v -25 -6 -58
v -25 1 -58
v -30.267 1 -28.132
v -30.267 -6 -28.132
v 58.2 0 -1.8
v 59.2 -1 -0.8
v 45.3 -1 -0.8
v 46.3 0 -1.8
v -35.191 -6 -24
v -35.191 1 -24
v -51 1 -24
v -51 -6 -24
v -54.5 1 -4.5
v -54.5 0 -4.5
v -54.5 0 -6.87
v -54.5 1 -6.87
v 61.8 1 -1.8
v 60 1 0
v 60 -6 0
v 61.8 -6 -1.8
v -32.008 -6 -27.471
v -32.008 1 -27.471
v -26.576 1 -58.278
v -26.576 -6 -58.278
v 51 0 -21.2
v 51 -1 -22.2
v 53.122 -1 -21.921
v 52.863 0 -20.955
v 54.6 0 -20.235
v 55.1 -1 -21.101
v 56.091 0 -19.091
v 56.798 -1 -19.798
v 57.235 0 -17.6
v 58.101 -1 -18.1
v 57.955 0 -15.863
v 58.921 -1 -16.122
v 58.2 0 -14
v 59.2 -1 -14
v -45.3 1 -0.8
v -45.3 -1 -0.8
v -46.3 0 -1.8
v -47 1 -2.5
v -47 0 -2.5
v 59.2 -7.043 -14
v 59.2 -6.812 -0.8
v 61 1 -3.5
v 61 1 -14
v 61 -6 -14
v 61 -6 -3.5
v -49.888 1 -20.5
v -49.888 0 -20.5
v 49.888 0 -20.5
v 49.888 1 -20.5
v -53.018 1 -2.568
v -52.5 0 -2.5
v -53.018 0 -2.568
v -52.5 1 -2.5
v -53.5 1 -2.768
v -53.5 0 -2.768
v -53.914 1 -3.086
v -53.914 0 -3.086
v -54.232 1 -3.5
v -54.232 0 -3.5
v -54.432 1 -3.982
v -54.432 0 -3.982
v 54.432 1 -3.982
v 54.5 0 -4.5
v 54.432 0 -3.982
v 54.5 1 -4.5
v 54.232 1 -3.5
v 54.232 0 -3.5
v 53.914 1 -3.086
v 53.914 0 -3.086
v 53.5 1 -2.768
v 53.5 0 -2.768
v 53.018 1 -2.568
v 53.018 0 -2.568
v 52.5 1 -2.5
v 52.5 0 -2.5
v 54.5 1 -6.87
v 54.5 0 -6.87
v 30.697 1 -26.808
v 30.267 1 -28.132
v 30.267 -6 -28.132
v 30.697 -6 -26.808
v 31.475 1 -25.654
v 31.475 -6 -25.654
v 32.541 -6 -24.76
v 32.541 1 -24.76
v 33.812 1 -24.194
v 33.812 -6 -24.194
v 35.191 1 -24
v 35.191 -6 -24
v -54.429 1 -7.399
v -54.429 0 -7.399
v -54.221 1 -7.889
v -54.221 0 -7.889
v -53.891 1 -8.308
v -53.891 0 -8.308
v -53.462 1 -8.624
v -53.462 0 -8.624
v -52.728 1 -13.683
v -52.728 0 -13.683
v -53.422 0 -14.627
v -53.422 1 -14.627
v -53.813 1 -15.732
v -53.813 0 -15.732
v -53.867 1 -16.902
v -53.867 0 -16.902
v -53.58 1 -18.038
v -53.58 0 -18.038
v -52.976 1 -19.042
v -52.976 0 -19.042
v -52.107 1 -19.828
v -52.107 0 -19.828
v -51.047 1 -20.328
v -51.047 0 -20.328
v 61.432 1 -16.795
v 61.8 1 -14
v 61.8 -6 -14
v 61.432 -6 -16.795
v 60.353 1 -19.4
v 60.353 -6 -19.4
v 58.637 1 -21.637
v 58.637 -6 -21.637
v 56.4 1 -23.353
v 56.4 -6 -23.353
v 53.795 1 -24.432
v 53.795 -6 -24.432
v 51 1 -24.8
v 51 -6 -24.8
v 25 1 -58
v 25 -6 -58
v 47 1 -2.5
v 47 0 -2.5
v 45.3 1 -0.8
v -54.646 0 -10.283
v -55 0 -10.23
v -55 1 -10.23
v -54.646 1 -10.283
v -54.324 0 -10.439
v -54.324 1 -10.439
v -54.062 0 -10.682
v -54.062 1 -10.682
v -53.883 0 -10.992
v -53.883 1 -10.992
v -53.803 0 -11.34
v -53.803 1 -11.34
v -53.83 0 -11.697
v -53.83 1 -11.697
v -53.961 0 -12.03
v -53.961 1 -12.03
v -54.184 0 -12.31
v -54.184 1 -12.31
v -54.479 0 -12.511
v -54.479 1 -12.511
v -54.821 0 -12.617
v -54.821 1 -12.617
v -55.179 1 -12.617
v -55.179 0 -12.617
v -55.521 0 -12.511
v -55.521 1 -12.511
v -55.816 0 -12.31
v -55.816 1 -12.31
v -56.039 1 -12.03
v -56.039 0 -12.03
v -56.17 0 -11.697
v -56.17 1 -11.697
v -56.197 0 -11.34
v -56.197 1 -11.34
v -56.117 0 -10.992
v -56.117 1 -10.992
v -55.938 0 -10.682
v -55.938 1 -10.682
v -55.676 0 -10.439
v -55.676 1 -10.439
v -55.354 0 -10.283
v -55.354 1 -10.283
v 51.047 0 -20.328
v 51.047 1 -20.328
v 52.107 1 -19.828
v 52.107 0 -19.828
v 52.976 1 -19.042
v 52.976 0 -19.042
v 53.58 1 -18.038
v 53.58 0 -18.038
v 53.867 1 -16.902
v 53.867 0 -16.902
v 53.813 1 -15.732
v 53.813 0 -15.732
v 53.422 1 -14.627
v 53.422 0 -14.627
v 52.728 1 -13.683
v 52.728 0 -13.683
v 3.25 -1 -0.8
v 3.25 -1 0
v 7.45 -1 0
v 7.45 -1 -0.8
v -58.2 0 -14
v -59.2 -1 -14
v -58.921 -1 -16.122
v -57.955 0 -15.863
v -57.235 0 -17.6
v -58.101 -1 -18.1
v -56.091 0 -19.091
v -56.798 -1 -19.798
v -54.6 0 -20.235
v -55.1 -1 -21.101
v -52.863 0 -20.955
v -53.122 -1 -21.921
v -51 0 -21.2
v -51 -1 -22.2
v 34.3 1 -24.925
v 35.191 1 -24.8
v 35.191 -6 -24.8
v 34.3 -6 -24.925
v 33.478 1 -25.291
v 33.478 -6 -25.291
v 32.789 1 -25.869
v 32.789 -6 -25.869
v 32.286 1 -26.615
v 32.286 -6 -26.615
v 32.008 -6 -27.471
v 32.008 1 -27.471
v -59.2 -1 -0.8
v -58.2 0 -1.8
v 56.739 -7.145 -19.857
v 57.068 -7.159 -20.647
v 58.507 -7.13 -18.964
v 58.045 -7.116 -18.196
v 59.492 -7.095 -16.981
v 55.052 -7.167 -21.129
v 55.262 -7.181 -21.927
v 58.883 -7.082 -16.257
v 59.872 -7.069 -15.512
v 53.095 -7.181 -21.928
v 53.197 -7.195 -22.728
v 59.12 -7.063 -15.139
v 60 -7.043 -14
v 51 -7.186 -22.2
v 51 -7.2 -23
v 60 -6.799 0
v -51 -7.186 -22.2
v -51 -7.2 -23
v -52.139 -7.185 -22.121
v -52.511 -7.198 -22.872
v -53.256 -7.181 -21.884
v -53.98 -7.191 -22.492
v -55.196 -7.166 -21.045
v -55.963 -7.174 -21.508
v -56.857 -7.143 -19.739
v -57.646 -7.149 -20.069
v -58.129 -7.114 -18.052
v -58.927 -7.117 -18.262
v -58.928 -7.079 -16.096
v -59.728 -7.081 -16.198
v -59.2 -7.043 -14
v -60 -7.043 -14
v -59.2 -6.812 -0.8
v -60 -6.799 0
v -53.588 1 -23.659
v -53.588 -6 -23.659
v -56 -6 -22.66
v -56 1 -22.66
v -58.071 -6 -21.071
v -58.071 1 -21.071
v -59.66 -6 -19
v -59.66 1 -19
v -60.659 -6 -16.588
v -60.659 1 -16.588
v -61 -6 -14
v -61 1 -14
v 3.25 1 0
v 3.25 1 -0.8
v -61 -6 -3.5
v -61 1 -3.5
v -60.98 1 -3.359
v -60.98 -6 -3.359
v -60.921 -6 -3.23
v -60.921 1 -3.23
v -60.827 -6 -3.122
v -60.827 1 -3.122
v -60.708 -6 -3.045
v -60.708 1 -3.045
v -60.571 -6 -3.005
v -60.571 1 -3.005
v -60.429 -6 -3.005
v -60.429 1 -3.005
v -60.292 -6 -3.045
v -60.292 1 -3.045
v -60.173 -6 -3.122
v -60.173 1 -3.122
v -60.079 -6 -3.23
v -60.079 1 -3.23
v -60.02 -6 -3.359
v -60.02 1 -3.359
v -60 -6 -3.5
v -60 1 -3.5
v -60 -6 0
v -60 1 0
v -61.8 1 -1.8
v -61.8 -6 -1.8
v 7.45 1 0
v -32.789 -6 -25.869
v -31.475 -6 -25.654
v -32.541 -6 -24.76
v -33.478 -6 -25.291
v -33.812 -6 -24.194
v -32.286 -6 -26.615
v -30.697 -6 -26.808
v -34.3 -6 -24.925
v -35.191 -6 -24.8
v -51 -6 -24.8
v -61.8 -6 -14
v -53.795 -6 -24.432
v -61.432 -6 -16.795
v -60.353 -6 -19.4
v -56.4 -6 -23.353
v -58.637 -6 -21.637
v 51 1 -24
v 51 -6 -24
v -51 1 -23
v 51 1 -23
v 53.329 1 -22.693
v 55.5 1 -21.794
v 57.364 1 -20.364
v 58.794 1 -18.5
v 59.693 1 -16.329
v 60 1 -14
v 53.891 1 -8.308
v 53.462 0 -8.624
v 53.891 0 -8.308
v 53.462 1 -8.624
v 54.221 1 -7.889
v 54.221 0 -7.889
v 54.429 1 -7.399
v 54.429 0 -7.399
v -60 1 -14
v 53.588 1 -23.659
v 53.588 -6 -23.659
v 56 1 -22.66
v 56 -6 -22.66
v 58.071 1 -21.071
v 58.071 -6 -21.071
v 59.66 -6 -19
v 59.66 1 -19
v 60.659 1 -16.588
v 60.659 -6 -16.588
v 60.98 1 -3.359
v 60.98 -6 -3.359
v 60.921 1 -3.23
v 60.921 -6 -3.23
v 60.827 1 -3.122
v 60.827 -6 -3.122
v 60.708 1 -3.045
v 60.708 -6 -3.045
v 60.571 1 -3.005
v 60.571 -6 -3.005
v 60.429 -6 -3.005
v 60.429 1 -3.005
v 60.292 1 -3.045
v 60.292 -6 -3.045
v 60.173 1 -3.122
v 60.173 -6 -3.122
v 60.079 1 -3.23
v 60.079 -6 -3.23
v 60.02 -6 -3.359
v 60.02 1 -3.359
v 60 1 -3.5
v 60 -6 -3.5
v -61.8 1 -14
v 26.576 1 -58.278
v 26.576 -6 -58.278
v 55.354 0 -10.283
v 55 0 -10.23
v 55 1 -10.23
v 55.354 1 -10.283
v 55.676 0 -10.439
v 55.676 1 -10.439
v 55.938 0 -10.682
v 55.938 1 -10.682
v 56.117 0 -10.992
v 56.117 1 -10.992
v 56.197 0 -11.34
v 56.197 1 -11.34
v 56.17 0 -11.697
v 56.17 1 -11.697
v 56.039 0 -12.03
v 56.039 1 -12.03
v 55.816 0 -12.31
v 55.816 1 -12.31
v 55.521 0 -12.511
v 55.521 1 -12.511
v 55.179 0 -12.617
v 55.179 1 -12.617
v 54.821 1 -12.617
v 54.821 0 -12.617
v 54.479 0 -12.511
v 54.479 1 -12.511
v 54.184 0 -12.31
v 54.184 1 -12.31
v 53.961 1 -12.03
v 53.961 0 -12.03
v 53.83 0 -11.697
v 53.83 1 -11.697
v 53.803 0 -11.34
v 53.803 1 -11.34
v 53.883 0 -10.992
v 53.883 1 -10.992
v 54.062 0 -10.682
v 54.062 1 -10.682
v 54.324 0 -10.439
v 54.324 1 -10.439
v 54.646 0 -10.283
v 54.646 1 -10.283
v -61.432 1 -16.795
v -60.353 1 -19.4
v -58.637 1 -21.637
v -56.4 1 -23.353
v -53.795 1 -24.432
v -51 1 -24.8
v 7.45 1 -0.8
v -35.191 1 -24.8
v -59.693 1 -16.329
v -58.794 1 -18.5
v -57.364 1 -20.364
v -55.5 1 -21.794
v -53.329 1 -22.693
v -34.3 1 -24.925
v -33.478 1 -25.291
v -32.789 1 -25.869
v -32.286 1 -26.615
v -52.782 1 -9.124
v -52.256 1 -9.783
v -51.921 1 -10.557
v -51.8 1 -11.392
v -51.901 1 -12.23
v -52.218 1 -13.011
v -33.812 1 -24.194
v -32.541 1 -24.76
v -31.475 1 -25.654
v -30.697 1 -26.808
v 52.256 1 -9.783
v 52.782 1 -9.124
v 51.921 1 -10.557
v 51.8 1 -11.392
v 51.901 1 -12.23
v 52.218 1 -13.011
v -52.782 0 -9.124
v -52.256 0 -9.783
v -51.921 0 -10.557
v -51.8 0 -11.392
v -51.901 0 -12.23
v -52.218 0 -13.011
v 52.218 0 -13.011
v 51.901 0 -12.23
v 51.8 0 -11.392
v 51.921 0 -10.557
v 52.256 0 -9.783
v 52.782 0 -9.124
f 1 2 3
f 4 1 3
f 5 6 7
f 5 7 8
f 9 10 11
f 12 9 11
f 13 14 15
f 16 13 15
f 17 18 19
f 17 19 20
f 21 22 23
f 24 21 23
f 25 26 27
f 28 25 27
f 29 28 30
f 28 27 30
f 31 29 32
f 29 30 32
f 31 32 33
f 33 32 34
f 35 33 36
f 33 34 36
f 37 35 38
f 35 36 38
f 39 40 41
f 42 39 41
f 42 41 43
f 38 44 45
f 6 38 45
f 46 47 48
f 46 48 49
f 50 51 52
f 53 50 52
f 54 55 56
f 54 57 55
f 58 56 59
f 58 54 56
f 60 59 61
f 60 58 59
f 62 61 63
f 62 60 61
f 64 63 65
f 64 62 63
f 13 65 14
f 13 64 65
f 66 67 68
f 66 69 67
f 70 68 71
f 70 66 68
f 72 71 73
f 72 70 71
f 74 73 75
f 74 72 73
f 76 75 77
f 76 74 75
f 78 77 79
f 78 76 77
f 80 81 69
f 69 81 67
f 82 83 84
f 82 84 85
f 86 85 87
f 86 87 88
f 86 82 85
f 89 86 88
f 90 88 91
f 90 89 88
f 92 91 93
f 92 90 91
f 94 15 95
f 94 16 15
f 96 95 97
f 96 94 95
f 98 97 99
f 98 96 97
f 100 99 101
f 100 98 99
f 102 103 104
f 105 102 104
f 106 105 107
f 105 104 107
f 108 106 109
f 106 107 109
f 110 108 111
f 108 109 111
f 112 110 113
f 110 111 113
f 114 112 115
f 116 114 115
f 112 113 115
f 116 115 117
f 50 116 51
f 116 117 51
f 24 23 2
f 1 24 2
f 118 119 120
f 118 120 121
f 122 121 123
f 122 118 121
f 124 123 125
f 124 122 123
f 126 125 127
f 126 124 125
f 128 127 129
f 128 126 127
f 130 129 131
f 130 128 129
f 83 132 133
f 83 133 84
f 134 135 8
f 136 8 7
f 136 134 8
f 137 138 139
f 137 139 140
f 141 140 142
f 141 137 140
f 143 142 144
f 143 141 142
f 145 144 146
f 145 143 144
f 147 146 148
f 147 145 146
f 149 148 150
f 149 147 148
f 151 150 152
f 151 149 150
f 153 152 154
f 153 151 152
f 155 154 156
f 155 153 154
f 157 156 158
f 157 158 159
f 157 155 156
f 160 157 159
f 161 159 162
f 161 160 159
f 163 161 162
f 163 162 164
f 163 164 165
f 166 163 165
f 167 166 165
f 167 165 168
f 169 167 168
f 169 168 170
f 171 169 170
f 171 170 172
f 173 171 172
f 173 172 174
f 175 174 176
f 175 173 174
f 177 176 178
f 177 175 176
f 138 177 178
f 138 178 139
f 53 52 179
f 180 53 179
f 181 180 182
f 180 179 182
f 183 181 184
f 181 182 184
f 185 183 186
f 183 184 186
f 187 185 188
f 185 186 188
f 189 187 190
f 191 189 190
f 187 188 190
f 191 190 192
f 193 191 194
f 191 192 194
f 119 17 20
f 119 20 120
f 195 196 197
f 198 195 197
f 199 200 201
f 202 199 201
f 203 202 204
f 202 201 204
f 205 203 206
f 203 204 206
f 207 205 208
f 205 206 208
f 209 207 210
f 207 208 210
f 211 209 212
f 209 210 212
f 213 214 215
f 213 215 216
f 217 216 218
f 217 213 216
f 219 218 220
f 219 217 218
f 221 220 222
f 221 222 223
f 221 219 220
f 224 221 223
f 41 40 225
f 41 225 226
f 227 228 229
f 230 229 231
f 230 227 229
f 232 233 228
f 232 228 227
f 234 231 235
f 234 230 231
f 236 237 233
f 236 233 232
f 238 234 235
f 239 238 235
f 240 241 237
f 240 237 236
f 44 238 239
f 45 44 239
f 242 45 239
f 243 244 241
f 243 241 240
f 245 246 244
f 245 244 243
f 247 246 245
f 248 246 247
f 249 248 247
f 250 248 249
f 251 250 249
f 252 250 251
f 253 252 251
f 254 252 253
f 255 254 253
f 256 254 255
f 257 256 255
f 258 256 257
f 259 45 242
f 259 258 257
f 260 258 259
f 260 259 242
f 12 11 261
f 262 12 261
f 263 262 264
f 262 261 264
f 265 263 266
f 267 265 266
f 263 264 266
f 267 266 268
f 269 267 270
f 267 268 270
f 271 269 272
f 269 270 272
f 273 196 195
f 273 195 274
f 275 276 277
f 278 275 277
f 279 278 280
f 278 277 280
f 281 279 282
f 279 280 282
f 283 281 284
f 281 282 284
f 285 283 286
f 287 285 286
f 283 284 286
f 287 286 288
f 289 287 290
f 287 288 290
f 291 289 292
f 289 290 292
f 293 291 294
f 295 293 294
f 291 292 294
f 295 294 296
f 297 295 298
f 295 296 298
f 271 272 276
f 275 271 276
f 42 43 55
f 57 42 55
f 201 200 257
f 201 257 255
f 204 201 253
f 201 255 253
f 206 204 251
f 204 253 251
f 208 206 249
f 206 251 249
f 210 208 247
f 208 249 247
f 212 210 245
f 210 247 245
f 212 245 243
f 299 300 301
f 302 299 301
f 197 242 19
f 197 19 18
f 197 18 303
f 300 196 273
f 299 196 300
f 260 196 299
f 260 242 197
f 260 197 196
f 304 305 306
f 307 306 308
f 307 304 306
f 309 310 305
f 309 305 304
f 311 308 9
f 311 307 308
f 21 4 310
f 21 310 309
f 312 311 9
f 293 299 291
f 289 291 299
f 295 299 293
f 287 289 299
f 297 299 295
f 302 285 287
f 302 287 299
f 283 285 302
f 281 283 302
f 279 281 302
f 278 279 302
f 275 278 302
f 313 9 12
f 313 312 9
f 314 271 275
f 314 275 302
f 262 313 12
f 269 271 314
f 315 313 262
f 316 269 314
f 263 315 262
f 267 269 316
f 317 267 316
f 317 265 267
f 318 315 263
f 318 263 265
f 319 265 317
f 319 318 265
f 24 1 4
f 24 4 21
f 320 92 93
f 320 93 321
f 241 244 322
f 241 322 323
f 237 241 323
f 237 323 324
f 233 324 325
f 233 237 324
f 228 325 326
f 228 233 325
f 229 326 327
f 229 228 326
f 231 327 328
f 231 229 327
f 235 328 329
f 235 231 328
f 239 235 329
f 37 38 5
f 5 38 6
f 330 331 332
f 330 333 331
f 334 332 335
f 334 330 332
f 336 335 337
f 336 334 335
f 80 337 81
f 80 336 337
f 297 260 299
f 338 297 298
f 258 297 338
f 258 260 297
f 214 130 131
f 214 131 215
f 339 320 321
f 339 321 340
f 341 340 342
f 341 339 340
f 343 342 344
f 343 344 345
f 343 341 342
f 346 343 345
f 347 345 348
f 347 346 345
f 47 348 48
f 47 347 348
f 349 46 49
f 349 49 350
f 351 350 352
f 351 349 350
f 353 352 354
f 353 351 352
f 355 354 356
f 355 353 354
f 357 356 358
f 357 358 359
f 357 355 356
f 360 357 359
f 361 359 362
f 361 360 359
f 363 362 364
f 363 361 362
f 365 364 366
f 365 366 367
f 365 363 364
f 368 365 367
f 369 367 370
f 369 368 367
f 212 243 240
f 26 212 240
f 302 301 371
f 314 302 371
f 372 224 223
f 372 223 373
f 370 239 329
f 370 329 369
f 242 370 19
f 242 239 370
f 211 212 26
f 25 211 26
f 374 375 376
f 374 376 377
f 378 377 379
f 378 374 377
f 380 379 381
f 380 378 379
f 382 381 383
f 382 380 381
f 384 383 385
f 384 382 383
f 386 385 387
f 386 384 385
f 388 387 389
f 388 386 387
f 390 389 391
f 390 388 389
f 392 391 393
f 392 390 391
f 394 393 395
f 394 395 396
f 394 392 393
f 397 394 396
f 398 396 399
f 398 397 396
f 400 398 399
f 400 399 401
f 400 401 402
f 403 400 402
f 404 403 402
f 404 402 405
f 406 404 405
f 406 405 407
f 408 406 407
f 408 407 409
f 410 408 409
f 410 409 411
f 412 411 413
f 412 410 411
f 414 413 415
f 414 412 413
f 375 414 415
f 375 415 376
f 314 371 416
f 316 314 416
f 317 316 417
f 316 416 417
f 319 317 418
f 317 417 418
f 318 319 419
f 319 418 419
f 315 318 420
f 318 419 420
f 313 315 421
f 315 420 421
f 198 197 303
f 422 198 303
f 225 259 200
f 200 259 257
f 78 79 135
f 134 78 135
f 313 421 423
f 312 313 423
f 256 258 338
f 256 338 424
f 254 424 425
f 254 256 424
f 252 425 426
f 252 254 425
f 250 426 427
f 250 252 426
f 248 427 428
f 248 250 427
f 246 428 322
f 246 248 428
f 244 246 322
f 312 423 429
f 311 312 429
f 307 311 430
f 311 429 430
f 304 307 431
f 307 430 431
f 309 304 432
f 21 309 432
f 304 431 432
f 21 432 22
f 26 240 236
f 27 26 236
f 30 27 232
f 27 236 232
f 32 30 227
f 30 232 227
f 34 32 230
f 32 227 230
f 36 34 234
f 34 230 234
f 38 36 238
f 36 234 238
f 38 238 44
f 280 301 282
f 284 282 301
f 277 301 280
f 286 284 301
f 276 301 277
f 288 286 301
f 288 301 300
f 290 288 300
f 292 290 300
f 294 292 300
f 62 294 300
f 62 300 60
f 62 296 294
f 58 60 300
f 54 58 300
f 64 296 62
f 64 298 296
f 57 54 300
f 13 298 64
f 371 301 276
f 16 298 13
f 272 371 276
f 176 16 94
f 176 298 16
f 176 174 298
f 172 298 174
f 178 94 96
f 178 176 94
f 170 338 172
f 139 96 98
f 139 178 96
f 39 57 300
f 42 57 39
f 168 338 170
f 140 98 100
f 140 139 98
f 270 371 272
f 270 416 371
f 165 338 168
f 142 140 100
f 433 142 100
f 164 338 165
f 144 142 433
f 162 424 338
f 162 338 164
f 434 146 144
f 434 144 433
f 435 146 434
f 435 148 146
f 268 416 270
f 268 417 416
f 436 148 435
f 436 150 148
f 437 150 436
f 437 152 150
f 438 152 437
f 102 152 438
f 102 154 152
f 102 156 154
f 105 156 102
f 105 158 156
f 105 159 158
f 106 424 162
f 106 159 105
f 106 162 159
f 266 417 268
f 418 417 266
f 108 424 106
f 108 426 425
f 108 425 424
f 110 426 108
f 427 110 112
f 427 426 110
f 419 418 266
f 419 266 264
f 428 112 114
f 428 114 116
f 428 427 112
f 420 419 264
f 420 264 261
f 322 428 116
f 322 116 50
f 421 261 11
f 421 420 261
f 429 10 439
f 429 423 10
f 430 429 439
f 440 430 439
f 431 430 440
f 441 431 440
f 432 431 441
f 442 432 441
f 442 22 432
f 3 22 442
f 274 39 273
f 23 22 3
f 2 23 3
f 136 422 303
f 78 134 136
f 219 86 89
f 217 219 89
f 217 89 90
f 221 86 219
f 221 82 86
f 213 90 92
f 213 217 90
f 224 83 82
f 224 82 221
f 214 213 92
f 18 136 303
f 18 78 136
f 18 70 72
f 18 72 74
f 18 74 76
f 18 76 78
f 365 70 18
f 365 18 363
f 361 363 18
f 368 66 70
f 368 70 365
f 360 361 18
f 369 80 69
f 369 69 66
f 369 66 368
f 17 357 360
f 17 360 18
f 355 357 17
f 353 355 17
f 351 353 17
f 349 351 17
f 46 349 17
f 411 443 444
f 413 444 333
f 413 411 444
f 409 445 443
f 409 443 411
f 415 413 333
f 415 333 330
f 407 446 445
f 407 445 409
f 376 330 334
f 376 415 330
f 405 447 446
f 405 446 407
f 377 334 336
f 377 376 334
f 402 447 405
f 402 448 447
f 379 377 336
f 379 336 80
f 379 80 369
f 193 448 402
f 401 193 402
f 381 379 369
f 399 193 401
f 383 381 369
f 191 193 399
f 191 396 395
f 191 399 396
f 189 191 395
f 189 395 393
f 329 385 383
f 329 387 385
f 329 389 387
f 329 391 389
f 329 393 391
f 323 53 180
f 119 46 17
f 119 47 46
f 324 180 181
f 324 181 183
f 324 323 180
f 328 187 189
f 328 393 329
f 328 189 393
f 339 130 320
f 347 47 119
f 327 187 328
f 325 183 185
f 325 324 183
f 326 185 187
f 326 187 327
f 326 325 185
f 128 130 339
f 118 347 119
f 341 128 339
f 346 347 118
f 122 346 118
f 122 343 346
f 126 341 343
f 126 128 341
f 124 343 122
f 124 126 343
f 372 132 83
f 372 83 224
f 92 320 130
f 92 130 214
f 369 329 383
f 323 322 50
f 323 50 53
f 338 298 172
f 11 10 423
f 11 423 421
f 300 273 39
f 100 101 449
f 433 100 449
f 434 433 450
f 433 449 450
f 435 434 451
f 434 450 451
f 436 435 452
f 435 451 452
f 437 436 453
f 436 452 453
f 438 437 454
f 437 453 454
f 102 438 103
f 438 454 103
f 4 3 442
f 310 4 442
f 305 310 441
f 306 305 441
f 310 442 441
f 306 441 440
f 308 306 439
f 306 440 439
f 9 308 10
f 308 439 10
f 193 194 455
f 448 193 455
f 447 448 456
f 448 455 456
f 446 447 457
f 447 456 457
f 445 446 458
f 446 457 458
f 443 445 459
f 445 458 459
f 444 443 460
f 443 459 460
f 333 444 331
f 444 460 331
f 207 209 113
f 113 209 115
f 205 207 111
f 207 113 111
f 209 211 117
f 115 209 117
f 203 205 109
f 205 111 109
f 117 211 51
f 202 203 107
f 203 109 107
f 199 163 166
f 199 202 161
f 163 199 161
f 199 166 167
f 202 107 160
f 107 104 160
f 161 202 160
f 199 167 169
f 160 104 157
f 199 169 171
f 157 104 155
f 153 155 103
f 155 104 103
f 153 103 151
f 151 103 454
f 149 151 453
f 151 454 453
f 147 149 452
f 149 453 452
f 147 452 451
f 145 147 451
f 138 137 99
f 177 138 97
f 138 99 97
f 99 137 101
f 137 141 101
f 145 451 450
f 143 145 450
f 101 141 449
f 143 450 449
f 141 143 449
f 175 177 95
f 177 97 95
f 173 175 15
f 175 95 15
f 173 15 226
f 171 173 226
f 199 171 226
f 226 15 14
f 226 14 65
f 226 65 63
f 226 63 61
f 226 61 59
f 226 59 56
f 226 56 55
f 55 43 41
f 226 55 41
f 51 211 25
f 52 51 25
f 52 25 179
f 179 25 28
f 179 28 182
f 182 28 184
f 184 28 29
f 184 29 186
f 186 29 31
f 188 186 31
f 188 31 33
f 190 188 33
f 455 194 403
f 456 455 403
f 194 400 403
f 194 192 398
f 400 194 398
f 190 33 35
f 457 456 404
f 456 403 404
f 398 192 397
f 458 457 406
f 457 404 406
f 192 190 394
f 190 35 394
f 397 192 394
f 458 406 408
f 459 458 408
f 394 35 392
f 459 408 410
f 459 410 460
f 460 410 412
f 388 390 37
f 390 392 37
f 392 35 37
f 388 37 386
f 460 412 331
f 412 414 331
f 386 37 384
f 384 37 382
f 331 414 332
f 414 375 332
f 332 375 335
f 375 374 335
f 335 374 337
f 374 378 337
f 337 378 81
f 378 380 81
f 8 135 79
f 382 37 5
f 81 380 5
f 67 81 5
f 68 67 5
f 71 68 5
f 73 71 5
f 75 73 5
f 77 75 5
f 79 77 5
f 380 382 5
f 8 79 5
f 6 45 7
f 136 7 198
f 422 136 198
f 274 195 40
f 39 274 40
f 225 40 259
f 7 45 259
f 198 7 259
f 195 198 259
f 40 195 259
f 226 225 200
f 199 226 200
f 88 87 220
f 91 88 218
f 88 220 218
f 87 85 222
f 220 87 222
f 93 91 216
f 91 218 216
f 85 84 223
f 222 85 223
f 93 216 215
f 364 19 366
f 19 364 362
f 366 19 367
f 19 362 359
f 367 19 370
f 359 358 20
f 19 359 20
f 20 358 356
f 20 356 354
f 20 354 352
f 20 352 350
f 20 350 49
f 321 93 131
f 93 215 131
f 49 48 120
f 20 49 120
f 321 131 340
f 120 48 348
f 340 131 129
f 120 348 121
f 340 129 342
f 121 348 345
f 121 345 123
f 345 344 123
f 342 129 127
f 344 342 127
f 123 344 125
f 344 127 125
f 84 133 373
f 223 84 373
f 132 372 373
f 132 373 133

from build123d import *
from build123d.topology import SkipClean

# Parameters (mm, degrees)
SKETCH1_R               = 1.2
BOSS_EXTRUDE1_DEPTH     = 1
BOSS_EXTRUDE2_START     = 7.2
BOSS_EXTRUDE2_DEPTH     = 8.2
CHAMFER1_SIZE           = 1
CUT_EXTRUDE1_DEPTH      = 65.659415401
CUT_EXTRUDE1_DEPTH_BACK = 65.659415401
CUT_EXTRUDE2_REACH      = 66.659
SKETCH11_W              = 4.2
SKETCH11_H              = 2
FILLET1_R               = 2
CHAMFER2_SIZE           = 1.7
BOSS_EXTRUDE3_START     = 1
BOSS_EXTRUDE3_DEPTH     = 7


with BuildPart() as part:
    # Sketch1 → Boss-Extrude1 (new body)
    with BuildSketch(Plane(origin=(0, 0, 0), x_dir=(1, 0, 0), z_dir=(0, 1, 0))):
        with BuildLine():
            Line((-60, 0), (-54.5, 0))
            Line((-54.5, 0), (54.5, 0))
            Line((54.5, 0), (60, 0))
            Line((60, 0), (60, 14))
            ThreePointArc((60, 14), (57.363961031, 20.363961031), (51, 23))
            Line((51, 23), (-51, 23))
            ThreePointArc((-51, 23), (-57.363961031, 20.363961031), (-60, 14))
            Line((-60, 14), (-60, 0))
        make_face()
        with Locations(Location((55, 11.43, 0), (0, 0, 270))):
            Circle(SKETCH1_R, mode=Mode.SUBTRACT)
        with Locations(Location((-55, 11.43, 0), (0, 0, 270))):
            Circle(SKETCH1_R, mode=Mode.SUBTRACT)
        with BuildLine():
            Line((-49.887750006, 20.5), (49.887750006, 20.5))
            ThreePointArc((49.887750006, 20.5), (53.580084408, 18.038397435), (52.727888892, 13.683333333))
            ThreePointArc((52.727888892, 13.683333333), (51.958770192, 10.434549723), (54.5, 8.269303874))
            Line((54.5, 8.269303874), (54.5, 2.5))
            Line((54.5, 2.5), (47, 2.5))
            Line((47, 2.5), (47, 0.8))
            Line((47, 0.8), (-47, 0.8))
            Line((-47, 0.8), (-47, 2.5))
            Line((-47, 2.5), (-54.5, 2.5))
            Line((-54.5, 2.5), (-54.5, 8.269303874))
            ThreePointArc((-54.5, 8.269303874), (-51.958770192, 10.434549723), (-52.727888892, 13.683333333))
            ThreePointArc((-52.727888892, 13.683333333), (-53.580084408, 18.038397435), (-49.887750006, 20.5))
        make_face(mode=Mode.SUBTRACT)
    extrude(amount=BOSS_EXTRUDE1_DEPTH)

    # Sketch8 → Boss-Extrude2 (add)
    with SkipClean():  # the faces are left unmerged after this step: merging them gives an invalid solid
        with BuildSketch(Plane(origin=(0, 0, 0), x_dir=(-1, 0, 0), z_dir=(0, -1, 0)).offset(BOSS_EXTRUDE2_START)):
            with BuildLine():
                Line((60, 0), (60, 14))
                ThreePointArc((60, 14), (57.363961031, 20.363961031), (51, 23))
                Line((51, 23), (-51, 23))
                ThreePointArc((-51, 23), (-57.363961031, 20.363961031), (-60, 14))
                Line((-60, 14), (-60, 0))
                Line((-60, 0), (60, 0))
            make_face()
            with BuildLine():
                Line((-59.2, 0.8), (59.2, 0.8))
                Line((59.2, 0.8), (59.2, 14))
                ThreePointArc((59.2, 14), (56.798275606, 19.798275606), (51, 22.2))
                Line((51, 22.2), (-51, 22.2))
                ThreePointArc((-51, 22.2), (-56.798275606, 19.798275606), (-59.2, 14))
                Line((-59.2, 14), (-59.2, 0.8))
            make_face(mode=Mode.SUBTRACT)
        extrude(amount=-BOSS_EXTRUDE2_DEPTH)
    add(part.part.scale(1), mode=Mode.REPLACE)  # the faces are merged on a copy

    # Chamfer1
    chamfer1_edges = [part.edges().sort_by_distance(p)[0] for p in [
        (-56.798275606, 0, -19.798275606),
        (-59.2, 0, -7.4),
        (0, 0, -22.2),
        (56.798275606, 0, -19.798275606),
        (59.2, 0, -7.4),
        (-53.1, 0, -0.8),
        (53.1, 0, -0.8),
    ]]
    chamfer(chamfer1_edges, length=CHAMFER1_SIZE)

    # Sketch9 → Cut-Extrude1 (cut, two sides: drawn at the far end of the back side and taken through both)
    with BuildSketch(Plane(origin=(0, 0, 0), x_dir=(0, 0, -1), z_dir=(1, 0, 0)).offset(-CUT_EXTRUDE1_DEPTH_BACK)):
        Polygon((-2, -7.2), (23, -7.2), (-2, -6.763623377), align=None)
    extrude(amount=CUT_EXTRUDE1_DEPTH + CUT_EXTRUDE1_DEPTH_BACK, mode=Mode.SUBTRACT)

    # Sketch11 → Cut-Extrude2 (cut, up to next)
    with BuildSketch(Plane.XY, mode=Mode.PRIVATE) as cut_extrude2_sk1:
        with Locations((5.35, 0)):
            Rectangle(SKETCH11_W, SKETCH11_H)
    cut_extrude2_tool1 = extrude(cut_extrude2_sk1.sketch, amount=-CUT_EXTRUDE2_REACH, mode=Mode.PRIVATE) & part.part
    add(cut_extrude2_tool1.solids().sort_by_distance((5.35, 0, 0))[0], mode=Mode.SUBTRACT)

    # Fillet1
    fillet1_edges = [part.edges().sort_by_distance(p)[0] for p in [
        (-54.5, 0.5, -8.269303874),
        (-54.5, 0.5, -2.5),
        (54.5, 0.5, -2.5),
        (54.5, 0.5, -8.269303874),
    ]]
    fillet(fillet1_edges, radius=FILLET1_R)

    # Chamfer2
    # the kernel refuses this chamfer: 1.7 mm, written as the material it adds along each edge
    with BuildSketch(Plane(origin=(-47, -5.37186108, -0.8), x_dir=(0.9996219169112968, 0, 0.02749587661058625), z_dir=(0, 1, 0))) as chamfer2_piece_1_section:
        Polygon((CHAMFER2_SIZE * 0.999621916911, CHAMFER2_SIZE * 0.0274958766106), (-CHAMFER2_SIZE * 0.0274958766106, CHAMFER2_SIZE * 0.999621916911), (0, 0), align=None)
    chamfer2_piece_1 = extrude(amount=6.37186108, mode=Mode.PRIVATE)
    chamfer2_piece_1 = split(chamfer2_piece_1, bisect_by=Plane(origin=(-46.825, 0, -2.15), z_dir=(0, 1, 0)), keep=Keep.TOP, mode=Mode.PRIVATE)
    add(chamfer2_piece_1)
    with BuildSketch(Plane(origin=(-47, -5.37186108, -0.8), x_dir=(0.9996219169112968, 0, 0.02749587661058625), z_dir=(0, 1, 0))) as chamfer2_piece_2_section:
        Polygon((CHAMFER2_SIZE * 0.999621916911, CHAMFER2_SIZE * 0.0274958766106), (-CHAMFER2_SIZE * 0.0274958766106, CHAMFER2_SIZE * 0.999621916911), (0, 0), align=None)
    chamfer2_piece_2 = extrude(amount=10.743722159, mode=Mode.PRIVATE)
    chamfer2_piece_2 = split(chamfer2_piece_2, bisect_by=Plane(origin=(-46.296341463, 0, -1.092682927), z_dir=(0, -1, 0)), keep=Keep.TOP, mode=Mode.PRIVATE)
    chamfer2_piece_2 = split(chamfer2_piece_2, bisect_by=Plane(origin=(-46.296341463, -0.530487805, -1.269512195), z_dir=(0, 0.7071067811865476, 0.7071067811865476)), keep=Keep.TOP, mode=Mode.PRIVATE)
    add(chamfer2_piece_2)
    with BuildSketch(Plane(origin=(47, 1, -0.8), x_dir=(0.02749587661058786, 0, -0.9996219169112968), z_dir=(0, -1, 0))) as chamfer2_piece_3_section:
        Polygon((CHAMFER2_SIZE * 0.999621916911, -CHAMFER2_SIZE * 0.0274958766106), (-CHAMFER2_SIZE * 0.0274958766106, -CHAMFER2_SIZE * 0.999621916911), (0, 0), align=None)
    chamfer2_piece_3 = extrude(amount=6.37186108, mode=Mode.PRIVATE)
    chamfer2_piece_3 = split(chamfer2_piece_3, bisect_by=Plane(origin=(46.417200072, 0.023893659, -1.823893659), z_dir=(0, 0.7071067811865476, 0.7071067811865476)), keep=Keep.TOP, mode=Mode.PRIVATE)
    add(chamfer2_piece_3)
    with BuildSketch(Plane(origin=(47, 5.37186108, -0.8), x_dir=(0.02749587661058786, 0, -0.9996219169112968), z_dir=(0, -1, 0))) as chamfer2_piece_4_section:
        Polygon((CHAMFER2_SIZE * 0.999621916911, -CHAMFER2_SIZE * 0.0274958766106), (-CHAMFER2_SIZE * 0.0274958766106, -CHAMFER2_SIZE * 0.999621916911), (0, 0), align=None)
    chamfer2_piece_4 = extrude(amount=10.743722159, mode=Mode.PRIVATE)
    chamfer2_piece_4 = split(chamfer2_piece_4, bisect_by=Plane(origin=(46.825, 0, -2.15), z_dir=(0, 1, 0)), keep=Keep.TOP, mode=Mode.PRIVATE)
    chamfer2_piece_4 = split(chamfer2_piece_4, bisect_by=Plane(origin=(46.825, 0.2625, -2.0625), z_dir=(0, -0.7071067811865476, -0.7071067811865476)), keep=Keep.TOP, mode=Mode.PRIVATE)
    add(chamfer2_piece_4)

    # Sketch12 → Boss-Extrude3 (add)
    with BuildSketch(Plane(origin=(0, 0, 0), x_dir=(1, 0, 0), z_dir=(0, 1, 0)).offset(BOSS_EXTRUDE3_START)):
        with BuildLine():
            Line((-60, 0), (-61.8, 1.8))
            Line((-61.8, 1.8), (-61.8, 14))
            ThreePointArc((-61.8, 14), (-58.636753237, 21.636753237), (-51, 24.8))
            Line((-51, 24.8), (-35.1906155, 24.8))
            ThreePointArc((-35.1906155, 24.8), (-33.11319707, 25.556118473), (-32.007825811, 27.470677654))
            Line((-32.007825811, 27.470677654), (-26.575692405, 58.277837084))
            Line((-26.575692405, 58.277837084), (-25, 58))
            Line((-25, 58), (-30.266576735, 28.131759112))
            ThreePointArc((-30.266576735, 28.131759112), (-31.976677452, 25.169777784), (-35.1906155, 24))
            Line((-35.1906155, 24), (-51, 24))
            ThreePointArc((-51, 24), (-58.071067812, 21.071067812), (-61, 14))
            Line((-61, 14), (-61, 3.5))
            ThreePointArc((-61, 3.5), (-60.5, 3), (-60, 3.5))
            Line((-60, 3.5), (-60, 0))
        make_face()
    boss_extrude3 = extrude(amount=-BOSS_EXTRUDE3_DEPTH)

    # Mirror2: Boss-Extrude3 across plane
    add(boss_extrude3.mirror(Plane(origin=(0, 0, 0), x_dir=(0, 0, 1), z_dir=(1, 0, 0))))


solid = part.part
